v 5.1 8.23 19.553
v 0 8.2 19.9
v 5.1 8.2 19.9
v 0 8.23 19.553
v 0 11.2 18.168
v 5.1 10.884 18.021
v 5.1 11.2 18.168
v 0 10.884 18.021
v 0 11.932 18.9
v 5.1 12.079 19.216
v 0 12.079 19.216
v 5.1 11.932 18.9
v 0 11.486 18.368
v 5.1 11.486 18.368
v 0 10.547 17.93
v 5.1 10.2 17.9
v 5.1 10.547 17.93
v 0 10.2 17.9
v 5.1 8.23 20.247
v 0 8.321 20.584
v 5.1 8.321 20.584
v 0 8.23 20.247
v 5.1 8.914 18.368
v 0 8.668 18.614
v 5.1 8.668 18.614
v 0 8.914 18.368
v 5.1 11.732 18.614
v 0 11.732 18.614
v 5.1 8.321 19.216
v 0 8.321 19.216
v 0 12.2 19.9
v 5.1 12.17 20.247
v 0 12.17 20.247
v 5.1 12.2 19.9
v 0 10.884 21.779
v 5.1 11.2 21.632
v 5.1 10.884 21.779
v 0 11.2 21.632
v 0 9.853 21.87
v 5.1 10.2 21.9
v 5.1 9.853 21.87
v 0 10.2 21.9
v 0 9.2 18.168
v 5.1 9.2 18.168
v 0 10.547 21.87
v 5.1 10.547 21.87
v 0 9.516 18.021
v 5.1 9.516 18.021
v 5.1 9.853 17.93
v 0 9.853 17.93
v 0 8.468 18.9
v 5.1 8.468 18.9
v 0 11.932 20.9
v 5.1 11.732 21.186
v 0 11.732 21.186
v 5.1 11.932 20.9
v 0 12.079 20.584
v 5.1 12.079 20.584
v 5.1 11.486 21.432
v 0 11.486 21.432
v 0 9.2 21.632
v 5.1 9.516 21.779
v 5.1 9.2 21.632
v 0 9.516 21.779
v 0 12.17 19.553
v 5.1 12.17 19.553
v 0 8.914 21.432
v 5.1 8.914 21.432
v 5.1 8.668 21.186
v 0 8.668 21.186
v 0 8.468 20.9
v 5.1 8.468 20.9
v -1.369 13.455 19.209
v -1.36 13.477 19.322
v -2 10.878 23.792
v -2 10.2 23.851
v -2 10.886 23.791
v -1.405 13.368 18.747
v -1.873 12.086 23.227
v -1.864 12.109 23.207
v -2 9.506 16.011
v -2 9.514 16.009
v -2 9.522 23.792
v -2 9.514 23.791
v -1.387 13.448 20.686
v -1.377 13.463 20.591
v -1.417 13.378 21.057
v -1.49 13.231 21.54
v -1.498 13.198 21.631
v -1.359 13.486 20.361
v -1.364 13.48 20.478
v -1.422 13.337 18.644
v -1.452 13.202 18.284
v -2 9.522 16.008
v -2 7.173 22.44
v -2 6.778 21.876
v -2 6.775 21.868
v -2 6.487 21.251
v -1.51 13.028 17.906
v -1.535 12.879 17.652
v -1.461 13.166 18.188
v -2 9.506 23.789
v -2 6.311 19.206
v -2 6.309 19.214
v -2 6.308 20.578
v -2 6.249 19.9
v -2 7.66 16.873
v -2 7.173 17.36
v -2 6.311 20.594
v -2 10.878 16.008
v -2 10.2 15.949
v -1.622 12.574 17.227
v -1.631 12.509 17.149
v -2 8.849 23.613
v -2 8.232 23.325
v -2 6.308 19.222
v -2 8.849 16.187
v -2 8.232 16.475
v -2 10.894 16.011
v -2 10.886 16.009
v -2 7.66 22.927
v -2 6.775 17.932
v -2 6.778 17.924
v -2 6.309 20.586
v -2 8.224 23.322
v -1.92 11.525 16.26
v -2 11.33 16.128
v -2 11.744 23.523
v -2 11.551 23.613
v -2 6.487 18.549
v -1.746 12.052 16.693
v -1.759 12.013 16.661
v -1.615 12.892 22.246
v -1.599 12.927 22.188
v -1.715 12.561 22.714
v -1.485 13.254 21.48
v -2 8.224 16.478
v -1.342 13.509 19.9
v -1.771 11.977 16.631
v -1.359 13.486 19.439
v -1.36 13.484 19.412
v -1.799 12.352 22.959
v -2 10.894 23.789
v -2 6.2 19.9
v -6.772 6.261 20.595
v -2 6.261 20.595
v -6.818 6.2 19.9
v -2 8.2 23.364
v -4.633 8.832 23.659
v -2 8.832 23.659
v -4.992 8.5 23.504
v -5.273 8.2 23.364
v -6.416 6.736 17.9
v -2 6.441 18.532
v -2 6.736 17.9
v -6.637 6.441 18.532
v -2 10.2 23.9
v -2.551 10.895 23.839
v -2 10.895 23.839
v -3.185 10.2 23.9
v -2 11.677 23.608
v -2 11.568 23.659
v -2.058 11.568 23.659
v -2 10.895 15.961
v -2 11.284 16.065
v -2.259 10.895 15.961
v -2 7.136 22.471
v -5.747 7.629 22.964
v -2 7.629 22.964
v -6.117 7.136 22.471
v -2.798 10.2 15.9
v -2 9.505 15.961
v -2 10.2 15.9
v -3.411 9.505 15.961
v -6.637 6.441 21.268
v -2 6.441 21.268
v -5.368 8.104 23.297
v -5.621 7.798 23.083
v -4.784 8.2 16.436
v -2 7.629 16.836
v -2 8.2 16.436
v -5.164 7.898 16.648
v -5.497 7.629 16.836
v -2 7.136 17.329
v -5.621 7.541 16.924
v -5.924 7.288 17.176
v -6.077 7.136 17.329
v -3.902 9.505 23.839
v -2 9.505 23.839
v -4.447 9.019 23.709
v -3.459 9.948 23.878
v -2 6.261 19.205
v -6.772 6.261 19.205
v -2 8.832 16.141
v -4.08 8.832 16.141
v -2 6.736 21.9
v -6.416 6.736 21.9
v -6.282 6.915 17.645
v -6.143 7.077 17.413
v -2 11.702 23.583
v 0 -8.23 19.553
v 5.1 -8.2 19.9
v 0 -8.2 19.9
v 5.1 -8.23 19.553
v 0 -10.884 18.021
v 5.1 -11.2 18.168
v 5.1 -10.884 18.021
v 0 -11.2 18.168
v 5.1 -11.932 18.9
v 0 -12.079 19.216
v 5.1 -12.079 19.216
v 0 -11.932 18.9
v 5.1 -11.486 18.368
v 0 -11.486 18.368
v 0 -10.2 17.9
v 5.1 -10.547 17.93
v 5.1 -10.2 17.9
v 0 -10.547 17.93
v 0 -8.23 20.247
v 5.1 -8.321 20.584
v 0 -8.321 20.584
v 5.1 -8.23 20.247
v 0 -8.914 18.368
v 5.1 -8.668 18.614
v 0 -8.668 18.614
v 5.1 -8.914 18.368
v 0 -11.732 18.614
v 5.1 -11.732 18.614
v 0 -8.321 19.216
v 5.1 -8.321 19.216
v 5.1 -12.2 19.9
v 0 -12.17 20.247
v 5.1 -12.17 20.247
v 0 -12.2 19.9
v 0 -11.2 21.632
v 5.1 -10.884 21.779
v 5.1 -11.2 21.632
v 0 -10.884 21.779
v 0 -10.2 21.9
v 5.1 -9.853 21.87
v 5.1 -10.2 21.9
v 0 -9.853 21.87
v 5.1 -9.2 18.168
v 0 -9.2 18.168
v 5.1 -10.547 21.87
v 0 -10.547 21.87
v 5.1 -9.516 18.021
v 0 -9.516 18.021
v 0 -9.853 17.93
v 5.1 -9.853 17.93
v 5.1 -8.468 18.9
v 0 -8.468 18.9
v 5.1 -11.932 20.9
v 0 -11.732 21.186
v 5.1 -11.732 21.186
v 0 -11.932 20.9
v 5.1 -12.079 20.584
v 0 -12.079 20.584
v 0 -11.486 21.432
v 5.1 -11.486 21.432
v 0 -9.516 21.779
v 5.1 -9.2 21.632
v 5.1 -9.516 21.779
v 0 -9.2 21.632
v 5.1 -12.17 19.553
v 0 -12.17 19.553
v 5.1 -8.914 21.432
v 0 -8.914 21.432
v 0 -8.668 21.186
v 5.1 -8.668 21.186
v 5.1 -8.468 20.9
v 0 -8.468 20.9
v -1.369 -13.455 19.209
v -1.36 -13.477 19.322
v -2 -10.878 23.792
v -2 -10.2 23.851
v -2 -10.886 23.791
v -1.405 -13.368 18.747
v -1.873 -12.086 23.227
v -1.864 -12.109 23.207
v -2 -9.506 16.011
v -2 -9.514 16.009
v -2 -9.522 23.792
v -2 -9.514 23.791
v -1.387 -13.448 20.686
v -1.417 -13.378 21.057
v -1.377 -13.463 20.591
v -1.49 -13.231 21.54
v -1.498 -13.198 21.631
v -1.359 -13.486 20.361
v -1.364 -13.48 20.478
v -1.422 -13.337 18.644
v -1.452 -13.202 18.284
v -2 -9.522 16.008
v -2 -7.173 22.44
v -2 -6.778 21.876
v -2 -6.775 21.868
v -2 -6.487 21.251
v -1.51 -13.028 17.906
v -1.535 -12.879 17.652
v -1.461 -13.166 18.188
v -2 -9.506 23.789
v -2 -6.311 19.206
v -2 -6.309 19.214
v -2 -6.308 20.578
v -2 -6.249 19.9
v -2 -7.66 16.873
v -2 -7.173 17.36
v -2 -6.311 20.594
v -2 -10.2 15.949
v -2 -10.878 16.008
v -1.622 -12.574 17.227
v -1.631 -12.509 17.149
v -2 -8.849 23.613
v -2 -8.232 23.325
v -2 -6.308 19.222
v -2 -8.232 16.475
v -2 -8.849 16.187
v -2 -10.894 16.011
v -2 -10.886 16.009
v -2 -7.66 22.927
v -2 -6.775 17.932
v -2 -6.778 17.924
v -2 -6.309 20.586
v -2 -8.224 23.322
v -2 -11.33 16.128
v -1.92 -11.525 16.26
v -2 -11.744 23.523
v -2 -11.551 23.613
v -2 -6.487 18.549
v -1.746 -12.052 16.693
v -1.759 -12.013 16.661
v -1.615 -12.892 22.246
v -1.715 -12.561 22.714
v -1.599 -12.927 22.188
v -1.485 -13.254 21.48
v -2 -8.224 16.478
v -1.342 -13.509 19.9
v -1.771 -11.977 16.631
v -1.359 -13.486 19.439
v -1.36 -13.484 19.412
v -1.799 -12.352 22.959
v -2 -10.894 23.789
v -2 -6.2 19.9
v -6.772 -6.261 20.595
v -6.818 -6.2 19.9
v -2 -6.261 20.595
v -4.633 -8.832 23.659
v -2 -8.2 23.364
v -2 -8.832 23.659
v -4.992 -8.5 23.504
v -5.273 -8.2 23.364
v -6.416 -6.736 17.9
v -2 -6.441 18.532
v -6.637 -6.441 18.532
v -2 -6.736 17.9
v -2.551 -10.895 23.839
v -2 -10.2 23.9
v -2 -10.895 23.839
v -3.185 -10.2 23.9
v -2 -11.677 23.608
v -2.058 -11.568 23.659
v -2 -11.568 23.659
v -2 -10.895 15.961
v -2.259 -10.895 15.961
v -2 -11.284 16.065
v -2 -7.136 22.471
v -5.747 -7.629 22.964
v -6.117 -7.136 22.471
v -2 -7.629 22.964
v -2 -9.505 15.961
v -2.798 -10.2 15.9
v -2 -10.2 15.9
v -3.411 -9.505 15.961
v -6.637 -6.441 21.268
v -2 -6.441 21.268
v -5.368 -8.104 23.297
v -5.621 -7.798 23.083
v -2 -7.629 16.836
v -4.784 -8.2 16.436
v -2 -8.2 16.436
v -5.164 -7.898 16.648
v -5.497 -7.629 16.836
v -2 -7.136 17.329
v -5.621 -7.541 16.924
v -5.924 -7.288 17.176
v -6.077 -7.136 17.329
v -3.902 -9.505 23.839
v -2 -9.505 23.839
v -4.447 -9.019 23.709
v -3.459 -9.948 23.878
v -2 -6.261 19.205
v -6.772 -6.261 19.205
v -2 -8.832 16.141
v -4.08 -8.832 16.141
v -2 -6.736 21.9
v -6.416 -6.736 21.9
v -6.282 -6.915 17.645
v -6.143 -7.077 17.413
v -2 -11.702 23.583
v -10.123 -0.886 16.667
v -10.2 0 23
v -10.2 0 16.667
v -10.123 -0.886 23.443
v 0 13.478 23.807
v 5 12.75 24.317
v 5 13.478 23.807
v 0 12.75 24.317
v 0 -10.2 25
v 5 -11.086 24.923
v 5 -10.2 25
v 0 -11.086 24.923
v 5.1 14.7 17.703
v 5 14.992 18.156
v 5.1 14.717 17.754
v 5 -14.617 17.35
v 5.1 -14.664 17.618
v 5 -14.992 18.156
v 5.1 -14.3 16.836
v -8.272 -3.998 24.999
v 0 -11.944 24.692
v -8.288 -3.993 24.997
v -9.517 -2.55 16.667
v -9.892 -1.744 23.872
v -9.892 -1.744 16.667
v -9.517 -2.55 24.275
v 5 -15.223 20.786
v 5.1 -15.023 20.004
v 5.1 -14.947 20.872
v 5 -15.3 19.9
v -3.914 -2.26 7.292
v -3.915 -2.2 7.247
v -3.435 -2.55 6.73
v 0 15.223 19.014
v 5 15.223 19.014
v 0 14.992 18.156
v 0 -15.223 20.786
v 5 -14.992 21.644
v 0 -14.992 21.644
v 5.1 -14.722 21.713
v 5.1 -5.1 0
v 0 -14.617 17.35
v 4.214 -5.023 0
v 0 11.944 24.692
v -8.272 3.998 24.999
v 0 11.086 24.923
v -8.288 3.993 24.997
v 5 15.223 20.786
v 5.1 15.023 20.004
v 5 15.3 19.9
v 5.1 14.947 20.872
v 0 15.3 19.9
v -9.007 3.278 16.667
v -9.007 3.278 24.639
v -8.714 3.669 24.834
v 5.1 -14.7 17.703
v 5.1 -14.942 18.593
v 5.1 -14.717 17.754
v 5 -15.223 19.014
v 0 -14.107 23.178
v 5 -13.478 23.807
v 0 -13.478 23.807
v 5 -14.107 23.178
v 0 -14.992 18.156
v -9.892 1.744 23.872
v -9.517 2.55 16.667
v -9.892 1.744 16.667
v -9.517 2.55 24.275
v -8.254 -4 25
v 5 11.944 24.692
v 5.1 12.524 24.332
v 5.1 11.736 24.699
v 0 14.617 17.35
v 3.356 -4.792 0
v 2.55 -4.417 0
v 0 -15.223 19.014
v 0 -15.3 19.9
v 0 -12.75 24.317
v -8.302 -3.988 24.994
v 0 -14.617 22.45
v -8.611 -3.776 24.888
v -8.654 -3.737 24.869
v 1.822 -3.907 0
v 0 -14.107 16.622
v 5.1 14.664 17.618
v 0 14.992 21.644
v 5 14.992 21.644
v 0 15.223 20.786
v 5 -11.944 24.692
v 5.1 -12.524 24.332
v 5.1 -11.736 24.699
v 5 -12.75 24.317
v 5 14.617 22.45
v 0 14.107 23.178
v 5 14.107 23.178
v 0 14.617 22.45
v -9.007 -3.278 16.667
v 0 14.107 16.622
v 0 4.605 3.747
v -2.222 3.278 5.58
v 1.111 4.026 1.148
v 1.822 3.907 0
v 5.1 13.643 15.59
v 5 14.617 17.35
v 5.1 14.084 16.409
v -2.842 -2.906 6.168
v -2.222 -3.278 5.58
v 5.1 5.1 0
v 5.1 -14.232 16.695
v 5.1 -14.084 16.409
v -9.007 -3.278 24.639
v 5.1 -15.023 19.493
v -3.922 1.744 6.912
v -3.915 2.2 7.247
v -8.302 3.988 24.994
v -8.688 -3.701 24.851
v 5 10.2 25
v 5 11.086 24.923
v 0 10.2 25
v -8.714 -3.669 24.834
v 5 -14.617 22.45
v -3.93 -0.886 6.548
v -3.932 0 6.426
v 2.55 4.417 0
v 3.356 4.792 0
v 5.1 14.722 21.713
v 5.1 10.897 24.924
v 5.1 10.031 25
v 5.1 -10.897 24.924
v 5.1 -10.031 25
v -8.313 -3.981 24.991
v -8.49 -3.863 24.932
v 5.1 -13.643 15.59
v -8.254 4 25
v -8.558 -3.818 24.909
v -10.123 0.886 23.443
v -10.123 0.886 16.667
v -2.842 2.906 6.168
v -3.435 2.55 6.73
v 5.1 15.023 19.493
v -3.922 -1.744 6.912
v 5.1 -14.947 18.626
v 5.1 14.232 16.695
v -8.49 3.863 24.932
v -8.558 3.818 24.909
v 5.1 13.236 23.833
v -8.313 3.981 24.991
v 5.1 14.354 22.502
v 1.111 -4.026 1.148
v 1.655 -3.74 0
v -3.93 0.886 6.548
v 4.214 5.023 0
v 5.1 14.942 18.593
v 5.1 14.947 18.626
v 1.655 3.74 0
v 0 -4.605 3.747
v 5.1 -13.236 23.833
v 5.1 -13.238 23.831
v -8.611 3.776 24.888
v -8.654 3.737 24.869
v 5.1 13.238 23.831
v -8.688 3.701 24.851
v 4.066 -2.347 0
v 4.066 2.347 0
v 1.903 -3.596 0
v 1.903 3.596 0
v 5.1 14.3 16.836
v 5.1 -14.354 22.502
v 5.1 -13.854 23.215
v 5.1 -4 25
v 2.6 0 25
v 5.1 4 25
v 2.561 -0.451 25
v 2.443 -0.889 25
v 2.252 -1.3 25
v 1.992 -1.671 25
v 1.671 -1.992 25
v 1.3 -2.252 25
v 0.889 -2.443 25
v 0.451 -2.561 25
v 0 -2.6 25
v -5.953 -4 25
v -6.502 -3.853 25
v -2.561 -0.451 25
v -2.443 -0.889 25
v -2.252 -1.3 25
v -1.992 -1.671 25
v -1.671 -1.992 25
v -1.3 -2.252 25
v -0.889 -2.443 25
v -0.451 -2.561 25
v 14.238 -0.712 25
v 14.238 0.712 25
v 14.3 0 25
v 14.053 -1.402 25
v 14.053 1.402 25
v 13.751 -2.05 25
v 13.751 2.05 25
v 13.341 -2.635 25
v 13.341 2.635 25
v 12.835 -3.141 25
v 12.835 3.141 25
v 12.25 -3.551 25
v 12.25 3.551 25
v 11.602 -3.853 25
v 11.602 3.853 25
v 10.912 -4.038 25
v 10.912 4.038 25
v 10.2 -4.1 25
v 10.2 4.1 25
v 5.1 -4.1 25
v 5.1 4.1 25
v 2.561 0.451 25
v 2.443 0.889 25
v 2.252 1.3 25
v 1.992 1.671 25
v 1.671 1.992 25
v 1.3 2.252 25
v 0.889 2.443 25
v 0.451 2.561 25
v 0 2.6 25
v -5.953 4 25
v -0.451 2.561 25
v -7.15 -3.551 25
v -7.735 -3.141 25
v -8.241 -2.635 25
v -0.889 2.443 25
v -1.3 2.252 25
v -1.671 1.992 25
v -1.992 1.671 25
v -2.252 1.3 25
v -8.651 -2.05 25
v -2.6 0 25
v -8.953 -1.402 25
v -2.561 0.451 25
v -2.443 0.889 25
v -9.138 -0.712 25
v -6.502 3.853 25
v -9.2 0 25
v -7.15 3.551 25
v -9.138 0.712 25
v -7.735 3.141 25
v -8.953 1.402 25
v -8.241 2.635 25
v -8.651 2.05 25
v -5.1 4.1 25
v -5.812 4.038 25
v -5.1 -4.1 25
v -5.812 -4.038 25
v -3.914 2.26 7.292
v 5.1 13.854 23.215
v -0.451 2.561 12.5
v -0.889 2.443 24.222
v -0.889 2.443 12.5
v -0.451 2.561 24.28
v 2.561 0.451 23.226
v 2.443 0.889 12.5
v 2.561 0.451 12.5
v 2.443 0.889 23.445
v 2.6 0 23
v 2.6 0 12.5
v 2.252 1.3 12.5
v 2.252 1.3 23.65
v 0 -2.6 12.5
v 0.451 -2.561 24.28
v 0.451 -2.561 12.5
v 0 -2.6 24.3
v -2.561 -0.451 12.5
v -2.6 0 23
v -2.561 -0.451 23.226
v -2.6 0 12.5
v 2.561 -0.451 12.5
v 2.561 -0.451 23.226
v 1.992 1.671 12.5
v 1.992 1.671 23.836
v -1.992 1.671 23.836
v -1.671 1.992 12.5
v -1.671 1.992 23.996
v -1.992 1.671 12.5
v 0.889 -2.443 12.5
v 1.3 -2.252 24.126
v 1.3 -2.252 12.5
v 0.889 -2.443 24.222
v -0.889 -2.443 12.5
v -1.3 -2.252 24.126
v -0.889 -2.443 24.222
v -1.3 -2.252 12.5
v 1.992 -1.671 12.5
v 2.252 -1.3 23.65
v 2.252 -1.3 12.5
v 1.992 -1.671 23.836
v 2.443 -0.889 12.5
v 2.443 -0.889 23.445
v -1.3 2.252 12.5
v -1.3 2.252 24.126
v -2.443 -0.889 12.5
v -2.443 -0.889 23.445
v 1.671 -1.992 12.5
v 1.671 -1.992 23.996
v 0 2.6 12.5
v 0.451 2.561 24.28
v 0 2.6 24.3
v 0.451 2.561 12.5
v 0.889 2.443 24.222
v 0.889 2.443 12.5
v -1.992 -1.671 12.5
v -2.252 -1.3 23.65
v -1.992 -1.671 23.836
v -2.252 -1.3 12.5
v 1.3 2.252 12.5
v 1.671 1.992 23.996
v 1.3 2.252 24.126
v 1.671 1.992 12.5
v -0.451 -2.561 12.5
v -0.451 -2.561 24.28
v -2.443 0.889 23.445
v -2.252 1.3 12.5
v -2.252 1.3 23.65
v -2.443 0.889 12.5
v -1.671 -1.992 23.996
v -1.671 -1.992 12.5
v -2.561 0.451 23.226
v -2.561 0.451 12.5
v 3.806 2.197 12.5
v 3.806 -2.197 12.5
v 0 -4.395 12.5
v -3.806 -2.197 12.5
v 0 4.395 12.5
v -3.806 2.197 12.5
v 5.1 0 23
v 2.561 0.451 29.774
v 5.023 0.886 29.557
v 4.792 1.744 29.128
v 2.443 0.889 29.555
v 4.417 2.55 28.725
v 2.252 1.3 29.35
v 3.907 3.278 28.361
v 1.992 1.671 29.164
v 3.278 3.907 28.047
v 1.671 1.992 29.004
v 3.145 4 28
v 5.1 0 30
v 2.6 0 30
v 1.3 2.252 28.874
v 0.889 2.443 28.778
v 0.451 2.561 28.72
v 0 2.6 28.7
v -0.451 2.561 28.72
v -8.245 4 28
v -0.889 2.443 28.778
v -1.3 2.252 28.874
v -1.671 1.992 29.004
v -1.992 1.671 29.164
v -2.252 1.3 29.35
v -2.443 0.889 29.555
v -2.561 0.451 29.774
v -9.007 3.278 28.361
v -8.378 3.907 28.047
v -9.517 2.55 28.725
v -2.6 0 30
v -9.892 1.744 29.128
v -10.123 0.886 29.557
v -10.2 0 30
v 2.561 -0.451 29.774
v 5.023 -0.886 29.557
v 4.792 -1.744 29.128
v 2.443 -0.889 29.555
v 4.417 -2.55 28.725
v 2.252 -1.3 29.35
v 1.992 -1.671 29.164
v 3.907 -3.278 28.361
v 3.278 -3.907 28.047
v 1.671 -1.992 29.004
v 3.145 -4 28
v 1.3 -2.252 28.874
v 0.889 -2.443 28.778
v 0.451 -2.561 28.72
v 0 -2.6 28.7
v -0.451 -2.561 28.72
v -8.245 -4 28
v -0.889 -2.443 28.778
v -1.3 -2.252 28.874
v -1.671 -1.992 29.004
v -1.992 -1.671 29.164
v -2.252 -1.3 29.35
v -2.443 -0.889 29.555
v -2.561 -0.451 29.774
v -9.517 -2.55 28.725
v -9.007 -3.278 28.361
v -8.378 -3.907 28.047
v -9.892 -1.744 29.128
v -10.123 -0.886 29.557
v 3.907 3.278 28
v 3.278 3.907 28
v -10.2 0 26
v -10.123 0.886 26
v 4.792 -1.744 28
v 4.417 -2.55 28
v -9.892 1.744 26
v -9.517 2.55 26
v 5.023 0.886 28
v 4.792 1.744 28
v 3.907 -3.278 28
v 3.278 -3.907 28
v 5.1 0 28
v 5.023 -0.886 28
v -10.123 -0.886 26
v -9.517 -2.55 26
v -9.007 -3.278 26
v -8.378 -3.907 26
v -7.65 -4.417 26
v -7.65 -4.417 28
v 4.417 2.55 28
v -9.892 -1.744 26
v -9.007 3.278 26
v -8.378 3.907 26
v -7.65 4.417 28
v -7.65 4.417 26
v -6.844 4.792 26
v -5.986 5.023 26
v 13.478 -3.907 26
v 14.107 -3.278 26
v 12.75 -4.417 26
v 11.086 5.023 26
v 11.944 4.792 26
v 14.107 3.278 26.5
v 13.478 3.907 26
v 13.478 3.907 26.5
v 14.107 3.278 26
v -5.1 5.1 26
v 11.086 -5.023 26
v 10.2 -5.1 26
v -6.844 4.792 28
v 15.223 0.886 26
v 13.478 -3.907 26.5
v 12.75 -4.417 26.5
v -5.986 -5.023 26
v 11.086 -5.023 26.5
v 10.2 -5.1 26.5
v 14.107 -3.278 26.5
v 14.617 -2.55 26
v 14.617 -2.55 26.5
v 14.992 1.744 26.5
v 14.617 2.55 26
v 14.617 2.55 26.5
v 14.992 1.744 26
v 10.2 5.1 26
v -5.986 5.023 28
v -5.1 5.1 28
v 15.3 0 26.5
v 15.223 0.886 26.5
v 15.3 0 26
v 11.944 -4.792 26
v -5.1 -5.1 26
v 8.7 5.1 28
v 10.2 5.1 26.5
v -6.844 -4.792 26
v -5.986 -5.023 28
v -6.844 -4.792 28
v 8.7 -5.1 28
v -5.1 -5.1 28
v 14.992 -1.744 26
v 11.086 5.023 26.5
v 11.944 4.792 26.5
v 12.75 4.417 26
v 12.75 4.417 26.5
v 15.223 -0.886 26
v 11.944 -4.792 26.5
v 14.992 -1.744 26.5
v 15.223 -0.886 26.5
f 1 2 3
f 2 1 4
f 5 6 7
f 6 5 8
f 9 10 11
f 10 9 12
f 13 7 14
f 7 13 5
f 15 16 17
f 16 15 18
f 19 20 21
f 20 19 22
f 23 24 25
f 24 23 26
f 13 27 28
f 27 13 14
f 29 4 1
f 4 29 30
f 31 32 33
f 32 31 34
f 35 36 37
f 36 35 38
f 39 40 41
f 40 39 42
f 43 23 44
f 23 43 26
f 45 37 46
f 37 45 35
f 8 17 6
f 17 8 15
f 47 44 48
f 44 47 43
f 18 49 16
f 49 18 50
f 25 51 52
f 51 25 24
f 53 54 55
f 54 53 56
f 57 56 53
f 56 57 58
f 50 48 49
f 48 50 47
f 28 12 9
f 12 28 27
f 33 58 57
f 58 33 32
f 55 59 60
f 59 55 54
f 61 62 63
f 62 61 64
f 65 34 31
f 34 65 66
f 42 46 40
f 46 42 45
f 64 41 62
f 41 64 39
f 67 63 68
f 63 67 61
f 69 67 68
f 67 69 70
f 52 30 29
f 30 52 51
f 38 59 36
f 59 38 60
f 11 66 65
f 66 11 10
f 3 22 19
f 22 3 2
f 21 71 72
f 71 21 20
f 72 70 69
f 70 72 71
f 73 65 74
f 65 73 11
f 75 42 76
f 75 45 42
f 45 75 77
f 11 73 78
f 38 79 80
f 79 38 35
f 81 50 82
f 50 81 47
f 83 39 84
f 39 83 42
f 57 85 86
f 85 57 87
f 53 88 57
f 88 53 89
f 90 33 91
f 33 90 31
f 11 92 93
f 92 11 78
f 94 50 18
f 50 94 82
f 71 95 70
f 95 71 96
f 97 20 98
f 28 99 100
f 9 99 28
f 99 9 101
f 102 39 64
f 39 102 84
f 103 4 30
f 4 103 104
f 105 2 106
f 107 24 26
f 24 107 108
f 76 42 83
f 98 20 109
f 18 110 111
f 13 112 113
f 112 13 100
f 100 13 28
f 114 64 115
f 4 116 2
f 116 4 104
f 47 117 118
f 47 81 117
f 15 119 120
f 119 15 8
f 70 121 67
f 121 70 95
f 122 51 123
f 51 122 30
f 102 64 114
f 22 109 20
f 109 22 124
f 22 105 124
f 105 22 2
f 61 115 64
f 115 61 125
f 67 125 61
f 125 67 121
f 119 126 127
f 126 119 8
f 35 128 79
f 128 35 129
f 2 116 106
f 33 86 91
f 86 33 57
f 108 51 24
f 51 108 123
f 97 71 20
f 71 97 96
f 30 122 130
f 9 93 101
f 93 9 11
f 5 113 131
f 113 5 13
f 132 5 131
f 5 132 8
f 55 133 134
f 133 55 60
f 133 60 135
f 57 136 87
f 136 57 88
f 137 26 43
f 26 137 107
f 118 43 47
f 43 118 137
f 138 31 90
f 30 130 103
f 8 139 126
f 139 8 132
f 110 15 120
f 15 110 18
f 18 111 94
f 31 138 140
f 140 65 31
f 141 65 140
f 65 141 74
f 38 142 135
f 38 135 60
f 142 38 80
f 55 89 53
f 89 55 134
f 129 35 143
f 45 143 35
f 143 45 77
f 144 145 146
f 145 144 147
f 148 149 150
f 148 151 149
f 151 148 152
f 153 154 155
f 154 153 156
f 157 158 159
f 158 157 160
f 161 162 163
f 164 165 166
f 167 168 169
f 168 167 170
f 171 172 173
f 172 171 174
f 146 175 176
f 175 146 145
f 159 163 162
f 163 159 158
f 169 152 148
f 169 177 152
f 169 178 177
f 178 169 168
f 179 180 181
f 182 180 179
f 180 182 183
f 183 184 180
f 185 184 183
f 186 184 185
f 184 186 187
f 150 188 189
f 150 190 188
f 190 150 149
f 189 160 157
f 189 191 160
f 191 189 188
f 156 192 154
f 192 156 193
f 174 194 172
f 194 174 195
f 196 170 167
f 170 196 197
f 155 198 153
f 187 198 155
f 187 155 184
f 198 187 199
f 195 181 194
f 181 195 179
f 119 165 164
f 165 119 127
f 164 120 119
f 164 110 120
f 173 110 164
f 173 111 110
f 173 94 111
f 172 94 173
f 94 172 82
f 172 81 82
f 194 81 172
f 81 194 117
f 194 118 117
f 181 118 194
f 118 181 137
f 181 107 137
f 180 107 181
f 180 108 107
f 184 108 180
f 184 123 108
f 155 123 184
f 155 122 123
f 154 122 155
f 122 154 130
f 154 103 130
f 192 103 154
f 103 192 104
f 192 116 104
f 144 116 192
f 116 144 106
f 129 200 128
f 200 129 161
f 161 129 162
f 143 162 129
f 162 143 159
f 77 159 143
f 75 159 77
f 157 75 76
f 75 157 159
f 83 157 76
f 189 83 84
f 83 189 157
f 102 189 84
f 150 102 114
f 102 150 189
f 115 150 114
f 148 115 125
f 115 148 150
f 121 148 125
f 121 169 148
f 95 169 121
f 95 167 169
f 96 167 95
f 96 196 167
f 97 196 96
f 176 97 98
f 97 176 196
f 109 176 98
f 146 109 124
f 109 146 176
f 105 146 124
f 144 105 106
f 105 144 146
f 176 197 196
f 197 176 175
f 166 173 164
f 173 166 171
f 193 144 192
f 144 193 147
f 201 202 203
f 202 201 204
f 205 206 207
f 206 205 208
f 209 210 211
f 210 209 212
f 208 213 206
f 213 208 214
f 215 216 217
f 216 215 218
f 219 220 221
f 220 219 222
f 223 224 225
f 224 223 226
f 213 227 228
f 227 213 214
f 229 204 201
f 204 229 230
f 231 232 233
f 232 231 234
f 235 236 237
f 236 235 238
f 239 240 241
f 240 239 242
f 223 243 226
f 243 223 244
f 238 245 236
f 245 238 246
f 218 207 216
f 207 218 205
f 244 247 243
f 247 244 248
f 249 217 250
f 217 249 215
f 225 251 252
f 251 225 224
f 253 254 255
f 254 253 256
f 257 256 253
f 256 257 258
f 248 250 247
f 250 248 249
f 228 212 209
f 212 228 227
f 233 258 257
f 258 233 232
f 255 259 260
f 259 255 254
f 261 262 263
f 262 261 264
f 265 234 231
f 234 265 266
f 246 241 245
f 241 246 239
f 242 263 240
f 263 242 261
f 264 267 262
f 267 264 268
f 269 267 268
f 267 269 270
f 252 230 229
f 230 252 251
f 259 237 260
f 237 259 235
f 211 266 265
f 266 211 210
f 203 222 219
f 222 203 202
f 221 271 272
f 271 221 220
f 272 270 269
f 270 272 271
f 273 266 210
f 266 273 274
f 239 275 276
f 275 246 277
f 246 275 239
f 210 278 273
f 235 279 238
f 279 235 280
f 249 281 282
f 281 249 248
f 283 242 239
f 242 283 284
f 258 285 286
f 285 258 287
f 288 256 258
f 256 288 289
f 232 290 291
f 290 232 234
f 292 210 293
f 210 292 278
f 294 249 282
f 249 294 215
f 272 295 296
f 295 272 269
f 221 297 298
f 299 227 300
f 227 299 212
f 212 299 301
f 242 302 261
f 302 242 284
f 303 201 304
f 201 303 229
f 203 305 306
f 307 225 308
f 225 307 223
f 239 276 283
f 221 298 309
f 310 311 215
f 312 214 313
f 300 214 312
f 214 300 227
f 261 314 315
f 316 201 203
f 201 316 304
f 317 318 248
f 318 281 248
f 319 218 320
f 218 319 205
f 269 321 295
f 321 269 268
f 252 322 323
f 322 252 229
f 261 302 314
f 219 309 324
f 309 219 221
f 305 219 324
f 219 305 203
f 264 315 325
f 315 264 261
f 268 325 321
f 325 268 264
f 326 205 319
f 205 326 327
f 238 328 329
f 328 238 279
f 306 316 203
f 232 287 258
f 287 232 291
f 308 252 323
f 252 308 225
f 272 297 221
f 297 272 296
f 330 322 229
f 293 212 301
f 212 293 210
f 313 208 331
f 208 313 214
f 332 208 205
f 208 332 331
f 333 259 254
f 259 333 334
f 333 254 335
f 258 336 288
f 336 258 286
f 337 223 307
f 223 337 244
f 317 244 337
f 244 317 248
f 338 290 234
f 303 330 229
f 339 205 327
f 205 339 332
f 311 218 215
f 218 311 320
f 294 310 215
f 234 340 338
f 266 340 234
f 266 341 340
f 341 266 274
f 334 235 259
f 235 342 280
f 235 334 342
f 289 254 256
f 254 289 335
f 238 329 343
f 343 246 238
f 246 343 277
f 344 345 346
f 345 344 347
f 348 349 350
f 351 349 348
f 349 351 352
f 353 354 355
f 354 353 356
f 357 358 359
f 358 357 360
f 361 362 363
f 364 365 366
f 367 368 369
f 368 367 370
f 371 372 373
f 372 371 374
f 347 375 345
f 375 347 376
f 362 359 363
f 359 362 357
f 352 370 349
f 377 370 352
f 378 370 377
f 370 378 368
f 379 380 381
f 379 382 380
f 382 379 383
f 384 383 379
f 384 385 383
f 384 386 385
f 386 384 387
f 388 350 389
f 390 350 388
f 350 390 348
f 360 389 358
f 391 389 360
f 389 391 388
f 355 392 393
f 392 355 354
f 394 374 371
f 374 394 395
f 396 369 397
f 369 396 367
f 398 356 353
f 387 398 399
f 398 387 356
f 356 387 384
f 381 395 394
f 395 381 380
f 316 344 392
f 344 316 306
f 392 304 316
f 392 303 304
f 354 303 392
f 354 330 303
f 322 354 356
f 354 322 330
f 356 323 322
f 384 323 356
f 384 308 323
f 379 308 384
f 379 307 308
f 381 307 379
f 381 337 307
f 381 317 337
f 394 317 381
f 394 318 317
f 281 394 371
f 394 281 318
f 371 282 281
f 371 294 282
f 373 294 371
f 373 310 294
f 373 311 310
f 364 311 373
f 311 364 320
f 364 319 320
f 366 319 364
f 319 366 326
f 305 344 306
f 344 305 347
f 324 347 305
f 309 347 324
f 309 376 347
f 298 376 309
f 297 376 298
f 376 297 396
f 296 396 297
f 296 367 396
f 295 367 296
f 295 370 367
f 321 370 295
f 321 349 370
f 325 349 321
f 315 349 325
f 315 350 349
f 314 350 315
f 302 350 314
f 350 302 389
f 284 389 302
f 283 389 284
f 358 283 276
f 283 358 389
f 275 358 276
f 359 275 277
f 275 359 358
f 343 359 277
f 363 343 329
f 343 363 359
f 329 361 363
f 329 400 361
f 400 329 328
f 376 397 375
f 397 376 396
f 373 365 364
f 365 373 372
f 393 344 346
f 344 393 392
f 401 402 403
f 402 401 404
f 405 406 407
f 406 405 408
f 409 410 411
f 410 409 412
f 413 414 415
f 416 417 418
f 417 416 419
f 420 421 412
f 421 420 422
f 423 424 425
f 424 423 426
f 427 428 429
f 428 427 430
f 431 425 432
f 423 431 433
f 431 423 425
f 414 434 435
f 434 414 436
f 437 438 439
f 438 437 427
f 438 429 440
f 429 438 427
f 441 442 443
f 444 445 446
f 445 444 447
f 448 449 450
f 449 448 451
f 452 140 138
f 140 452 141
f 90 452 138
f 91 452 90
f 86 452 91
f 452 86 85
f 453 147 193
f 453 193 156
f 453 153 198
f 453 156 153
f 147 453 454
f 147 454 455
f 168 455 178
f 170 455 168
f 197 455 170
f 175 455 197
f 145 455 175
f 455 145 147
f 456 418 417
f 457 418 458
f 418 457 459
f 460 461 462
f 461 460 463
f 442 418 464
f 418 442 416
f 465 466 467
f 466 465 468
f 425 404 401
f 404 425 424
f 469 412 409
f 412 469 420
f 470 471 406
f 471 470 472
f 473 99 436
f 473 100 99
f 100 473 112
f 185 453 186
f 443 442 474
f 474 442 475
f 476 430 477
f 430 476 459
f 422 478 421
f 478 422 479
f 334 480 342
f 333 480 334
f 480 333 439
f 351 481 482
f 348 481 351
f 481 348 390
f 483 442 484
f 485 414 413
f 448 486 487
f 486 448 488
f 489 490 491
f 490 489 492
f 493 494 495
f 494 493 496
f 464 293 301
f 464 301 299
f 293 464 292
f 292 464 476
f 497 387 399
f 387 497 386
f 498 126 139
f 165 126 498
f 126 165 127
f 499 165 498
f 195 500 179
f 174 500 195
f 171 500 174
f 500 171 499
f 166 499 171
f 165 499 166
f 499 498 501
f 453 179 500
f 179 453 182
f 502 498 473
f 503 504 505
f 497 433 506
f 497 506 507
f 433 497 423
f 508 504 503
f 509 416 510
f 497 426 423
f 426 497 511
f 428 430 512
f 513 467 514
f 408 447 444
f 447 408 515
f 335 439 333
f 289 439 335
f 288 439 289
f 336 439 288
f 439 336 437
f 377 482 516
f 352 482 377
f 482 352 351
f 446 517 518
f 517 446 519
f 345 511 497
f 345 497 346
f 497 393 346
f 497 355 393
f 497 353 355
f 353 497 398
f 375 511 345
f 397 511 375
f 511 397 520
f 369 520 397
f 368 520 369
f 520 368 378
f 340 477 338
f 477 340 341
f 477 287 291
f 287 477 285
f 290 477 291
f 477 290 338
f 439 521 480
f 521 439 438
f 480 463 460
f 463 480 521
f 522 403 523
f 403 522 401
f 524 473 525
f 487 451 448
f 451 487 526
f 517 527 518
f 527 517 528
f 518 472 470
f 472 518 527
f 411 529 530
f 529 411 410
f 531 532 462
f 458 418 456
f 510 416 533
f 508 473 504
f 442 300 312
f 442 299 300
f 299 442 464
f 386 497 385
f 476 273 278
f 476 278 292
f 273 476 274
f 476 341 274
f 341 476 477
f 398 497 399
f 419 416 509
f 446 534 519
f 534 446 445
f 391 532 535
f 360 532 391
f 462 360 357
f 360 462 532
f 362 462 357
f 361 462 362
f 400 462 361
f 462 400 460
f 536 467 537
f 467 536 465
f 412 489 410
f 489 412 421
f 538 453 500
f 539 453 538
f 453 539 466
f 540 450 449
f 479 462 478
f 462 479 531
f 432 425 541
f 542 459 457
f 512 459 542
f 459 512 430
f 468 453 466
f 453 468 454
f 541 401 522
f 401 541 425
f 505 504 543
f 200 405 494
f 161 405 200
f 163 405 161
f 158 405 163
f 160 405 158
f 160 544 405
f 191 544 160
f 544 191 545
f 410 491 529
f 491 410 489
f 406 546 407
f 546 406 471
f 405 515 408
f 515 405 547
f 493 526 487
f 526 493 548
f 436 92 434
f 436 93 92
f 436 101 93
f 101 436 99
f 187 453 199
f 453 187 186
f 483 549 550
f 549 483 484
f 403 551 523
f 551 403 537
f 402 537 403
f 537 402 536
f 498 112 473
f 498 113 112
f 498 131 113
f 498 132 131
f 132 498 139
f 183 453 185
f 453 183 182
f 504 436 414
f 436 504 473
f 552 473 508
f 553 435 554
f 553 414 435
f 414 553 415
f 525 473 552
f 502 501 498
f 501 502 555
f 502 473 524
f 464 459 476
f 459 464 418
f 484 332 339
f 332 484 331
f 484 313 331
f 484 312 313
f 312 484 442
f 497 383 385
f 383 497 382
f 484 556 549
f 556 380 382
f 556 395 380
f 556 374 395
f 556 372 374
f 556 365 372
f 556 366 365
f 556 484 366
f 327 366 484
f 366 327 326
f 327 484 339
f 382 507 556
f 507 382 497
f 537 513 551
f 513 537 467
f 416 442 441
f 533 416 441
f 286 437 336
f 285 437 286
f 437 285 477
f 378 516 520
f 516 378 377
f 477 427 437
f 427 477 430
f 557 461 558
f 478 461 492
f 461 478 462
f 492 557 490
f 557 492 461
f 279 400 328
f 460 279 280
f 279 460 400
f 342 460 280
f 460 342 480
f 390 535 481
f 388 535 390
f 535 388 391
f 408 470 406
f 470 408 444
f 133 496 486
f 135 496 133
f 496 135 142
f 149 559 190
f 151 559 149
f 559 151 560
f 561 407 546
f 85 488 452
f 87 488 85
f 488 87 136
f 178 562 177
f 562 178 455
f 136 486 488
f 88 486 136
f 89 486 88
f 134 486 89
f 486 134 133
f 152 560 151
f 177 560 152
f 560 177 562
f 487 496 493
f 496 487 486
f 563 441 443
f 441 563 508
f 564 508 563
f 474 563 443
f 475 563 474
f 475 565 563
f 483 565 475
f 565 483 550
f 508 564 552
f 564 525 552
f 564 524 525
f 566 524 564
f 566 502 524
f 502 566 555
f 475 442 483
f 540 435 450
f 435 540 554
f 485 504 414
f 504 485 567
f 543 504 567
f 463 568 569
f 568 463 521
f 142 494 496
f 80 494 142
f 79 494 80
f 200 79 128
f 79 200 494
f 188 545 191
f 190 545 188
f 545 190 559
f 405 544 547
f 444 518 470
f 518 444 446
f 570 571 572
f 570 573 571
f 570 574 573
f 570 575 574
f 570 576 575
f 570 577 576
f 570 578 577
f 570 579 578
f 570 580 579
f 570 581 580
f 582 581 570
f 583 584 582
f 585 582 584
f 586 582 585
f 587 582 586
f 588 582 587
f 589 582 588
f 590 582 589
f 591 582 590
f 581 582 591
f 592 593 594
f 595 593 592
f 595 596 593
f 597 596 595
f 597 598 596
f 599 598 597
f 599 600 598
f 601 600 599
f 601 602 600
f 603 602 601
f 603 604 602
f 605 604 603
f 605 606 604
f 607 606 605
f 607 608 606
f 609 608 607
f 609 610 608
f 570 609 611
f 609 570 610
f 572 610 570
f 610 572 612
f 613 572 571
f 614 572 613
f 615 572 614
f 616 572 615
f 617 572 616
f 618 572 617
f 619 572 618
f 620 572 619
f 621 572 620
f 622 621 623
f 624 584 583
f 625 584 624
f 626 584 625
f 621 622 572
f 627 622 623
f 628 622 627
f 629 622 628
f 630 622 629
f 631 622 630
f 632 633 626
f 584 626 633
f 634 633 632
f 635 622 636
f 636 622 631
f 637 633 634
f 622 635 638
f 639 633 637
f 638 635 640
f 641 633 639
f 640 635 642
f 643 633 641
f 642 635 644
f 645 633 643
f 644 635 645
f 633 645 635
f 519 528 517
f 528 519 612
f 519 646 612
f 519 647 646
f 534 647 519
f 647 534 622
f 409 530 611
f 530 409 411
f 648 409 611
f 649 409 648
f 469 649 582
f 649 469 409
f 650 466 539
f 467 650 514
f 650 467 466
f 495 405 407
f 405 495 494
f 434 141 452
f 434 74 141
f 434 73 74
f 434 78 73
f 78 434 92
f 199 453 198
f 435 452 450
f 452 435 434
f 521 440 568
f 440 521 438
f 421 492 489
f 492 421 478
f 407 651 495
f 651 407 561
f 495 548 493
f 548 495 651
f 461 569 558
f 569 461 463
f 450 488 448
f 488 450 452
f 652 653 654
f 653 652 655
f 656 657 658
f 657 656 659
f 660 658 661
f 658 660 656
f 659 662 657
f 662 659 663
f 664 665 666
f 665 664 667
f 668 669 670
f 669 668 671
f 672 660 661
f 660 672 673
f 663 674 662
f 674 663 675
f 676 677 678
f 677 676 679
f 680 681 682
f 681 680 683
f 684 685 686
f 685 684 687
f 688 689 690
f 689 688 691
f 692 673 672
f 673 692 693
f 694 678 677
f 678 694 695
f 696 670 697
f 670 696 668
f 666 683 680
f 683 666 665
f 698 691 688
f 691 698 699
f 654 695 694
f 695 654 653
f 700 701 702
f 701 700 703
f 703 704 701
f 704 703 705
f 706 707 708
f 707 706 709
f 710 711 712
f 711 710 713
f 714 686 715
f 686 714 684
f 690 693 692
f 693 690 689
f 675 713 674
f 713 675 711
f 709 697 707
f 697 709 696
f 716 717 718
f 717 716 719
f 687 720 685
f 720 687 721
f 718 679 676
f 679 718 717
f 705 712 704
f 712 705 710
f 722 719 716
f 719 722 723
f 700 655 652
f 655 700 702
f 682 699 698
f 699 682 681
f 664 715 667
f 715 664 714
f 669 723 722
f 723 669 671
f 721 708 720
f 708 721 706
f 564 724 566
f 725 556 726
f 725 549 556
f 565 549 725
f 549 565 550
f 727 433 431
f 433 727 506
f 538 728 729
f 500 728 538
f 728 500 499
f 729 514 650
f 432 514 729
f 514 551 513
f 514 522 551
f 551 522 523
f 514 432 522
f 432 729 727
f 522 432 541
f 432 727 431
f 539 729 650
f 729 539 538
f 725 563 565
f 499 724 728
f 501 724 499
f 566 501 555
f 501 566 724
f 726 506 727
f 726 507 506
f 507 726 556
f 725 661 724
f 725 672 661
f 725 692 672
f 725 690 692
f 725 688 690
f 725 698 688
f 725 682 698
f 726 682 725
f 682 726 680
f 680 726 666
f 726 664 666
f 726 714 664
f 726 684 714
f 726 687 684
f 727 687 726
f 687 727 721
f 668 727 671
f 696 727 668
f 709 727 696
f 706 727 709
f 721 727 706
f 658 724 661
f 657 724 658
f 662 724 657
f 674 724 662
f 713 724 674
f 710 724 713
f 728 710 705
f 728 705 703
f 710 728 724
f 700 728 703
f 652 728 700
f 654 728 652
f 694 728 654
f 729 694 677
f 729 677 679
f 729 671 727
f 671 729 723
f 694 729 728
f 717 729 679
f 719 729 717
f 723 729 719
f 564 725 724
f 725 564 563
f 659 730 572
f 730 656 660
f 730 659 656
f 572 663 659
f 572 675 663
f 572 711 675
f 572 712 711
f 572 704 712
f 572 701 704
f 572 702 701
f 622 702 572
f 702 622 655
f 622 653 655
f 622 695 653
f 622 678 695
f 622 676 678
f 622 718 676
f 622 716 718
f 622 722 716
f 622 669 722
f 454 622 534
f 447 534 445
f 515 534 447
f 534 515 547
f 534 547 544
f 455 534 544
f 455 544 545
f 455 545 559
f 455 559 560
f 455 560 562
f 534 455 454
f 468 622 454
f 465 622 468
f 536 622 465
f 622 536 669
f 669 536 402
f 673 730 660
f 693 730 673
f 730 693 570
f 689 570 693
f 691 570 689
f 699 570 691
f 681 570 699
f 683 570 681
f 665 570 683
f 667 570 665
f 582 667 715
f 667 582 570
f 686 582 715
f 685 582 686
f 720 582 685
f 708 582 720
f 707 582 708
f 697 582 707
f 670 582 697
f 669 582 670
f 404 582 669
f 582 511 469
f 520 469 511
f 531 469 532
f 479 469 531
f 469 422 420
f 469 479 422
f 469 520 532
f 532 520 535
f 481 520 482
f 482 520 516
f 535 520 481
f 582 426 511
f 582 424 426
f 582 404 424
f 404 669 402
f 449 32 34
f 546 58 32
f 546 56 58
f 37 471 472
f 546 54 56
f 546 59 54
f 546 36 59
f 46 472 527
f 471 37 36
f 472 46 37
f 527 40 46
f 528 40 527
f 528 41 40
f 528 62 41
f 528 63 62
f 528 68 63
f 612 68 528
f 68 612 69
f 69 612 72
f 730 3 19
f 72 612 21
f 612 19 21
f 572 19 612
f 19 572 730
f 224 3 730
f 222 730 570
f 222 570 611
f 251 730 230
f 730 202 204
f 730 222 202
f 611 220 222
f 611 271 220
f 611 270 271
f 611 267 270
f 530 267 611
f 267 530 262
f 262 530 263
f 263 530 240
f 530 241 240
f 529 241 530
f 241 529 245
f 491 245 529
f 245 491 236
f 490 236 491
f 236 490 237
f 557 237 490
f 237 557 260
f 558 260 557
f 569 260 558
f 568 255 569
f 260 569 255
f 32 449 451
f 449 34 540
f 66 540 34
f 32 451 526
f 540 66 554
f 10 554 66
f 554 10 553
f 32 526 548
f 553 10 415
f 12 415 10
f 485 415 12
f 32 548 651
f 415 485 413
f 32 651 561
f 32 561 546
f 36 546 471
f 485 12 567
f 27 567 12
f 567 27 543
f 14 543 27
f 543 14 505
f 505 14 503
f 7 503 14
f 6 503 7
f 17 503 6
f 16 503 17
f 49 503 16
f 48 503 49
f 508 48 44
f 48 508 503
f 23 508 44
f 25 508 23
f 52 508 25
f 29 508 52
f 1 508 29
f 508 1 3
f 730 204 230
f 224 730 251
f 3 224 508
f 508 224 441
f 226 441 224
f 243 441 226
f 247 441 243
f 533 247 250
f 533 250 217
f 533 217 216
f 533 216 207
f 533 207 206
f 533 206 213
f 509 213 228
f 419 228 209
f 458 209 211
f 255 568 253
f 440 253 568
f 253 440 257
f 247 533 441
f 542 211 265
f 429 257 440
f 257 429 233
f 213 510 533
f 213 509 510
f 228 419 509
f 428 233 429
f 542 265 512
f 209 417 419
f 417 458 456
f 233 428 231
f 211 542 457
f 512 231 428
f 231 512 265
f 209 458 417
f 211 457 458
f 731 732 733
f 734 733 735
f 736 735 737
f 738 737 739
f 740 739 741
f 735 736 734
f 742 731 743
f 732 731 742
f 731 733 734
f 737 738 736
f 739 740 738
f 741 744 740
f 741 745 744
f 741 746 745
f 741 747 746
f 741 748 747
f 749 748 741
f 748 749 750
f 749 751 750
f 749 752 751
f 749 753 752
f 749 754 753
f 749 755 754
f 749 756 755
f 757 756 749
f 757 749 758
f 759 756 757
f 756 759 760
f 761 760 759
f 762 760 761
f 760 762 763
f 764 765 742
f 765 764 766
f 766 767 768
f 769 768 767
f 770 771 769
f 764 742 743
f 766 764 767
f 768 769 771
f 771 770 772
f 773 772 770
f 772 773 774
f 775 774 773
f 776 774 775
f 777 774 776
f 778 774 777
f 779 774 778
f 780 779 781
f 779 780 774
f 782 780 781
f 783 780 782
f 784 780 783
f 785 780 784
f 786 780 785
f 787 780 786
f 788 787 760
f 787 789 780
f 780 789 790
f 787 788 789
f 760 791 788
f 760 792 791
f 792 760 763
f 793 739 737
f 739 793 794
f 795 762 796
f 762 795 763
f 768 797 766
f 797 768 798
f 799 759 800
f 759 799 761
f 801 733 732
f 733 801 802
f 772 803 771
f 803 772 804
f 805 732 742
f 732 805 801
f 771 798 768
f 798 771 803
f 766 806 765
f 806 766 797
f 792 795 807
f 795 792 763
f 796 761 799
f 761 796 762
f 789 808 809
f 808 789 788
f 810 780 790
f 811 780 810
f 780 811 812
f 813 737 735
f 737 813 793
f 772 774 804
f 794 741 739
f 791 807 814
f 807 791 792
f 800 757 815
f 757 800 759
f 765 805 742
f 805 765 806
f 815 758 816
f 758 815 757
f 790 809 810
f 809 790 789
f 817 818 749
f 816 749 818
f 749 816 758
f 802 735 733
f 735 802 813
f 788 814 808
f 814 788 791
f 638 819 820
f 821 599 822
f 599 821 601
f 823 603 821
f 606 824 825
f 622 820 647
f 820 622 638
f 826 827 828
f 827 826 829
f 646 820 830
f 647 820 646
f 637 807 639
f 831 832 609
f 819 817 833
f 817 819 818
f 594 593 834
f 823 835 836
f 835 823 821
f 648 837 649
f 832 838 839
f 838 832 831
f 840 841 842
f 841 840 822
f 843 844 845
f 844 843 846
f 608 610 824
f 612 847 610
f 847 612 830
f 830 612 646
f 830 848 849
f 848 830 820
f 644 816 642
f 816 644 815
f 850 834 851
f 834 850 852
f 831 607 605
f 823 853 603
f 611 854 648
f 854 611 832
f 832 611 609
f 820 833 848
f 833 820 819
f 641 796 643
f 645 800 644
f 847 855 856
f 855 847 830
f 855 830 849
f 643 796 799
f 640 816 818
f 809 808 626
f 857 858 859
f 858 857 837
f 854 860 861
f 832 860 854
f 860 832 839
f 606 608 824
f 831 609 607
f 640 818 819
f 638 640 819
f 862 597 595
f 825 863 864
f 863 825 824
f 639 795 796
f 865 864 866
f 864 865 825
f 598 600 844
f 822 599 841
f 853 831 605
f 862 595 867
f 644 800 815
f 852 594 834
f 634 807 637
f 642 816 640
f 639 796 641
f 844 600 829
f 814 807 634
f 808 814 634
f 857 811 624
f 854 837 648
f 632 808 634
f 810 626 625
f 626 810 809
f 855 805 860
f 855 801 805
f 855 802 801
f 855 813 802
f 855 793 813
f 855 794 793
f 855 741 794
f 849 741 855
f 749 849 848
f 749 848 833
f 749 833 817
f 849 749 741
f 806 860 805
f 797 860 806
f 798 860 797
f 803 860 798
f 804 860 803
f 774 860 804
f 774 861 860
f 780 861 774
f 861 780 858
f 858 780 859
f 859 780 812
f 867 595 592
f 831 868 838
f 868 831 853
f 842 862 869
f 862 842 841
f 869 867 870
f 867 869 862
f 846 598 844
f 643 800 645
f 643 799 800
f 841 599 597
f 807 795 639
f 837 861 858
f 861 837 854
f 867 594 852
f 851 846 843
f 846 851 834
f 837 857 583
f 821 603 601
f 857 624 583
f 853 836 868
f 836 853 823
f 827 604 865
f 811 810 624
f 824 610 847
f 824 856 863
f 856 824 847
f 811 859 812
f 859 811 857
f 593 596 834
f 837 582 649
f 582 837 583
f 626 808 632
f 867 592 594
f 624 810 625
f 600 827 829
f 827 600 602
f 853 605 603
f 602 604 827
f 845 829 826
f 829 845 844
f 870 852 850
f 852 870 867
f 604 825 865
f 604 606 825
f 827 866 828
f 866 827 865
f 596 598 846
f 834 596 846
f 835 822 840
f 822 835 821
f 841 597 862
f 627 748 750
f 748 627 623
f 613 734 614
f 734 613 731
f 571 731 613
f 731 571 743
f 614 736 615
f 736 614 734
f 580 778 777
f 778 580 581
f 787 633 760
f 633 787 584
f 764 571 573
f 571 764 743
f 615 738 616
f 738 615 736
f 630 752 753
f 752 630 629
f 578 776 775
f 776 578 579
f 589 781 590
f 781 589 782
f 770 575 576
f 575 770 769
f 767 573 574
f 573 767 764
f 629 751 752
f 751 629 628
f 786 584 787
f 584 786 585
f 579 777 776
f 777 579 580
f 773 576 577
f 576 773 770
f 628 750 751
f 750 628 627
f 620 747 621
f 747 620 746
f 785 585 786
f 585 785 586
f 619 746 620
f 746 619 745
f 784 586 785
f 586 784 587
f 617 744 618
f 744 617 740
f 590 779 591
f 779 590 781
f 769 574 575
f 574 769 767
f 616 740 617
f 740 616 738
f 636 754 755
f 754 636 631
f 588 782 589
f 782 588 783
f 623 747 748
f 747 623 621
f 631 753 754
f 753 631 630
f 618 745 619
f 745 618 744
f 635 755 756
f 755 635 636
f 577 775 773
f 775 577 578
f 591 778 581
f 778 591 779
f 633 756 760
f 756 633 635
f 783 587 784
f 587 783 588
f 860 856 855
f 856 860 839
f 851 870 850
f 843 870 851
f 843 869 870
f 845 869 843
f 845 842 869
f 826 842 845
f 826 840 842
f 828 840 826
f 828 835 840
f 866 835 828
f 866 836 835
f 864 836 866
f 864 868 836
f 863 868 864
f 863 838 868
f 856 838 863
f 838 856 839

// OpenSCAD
// file: configuration.scad
in = 25.4;
beam = 20;

wall = 6;   //beefy carriages


spacer_height = 6; 

//this is for the big v-wheels
wheel_thick = 10.23;
wheel_rad = 23.9/2;
wheel_eff_rad = 19/2;   //radius sticking out of the v-slot

/*
//this is for the mini v-wheels
wheel_thick = 8.8;
wheel_rad = 15.23/2;
wheel_eff_rad = 11/2;   //radius sticking out of the v-slot
*/

main_beam_length = 500;
cross_beam_length = 500;

//height of the stack!
//the magnet is at zero, so nothing sticks up above the Z plane.
magnet_height = in/2;
magnet_rad = in/4;
carriage_clearance = wall + (wheel_thick/2+spacer_height)-beam/2;
echo(carriage_clearance);
                //magnet         this beam  X carriage             x beam
y_beam_height = -magnet_height - beam/2 -   carriage_clearance -   beam - carriage_clearance;
x_beam_height = -magnet_height - beam/2 - carriage_clearance;
magnet_carriage_height = -magnet_height-wall;
beam_carriage_height = -magnet_height-carriage_clearance-beam-wall;

//idler RANDOM NUMBERS
idler_rad = 9;
idler_flange_rad = 11;
idler_flange_thick = 1.5;
idler_height = 12;

//pulley RANDOM NUMBERS
pulley_rad = 9;
pulley_flange_rad = 11;
pulley_flange_thick = 1.5;
pulley_base_rad = 12;
pulley_base_thick = 10;
pulley_height = 18;


//screws et al
m5_rad = 5/2+.1;
m5_nut_rad = 8.79/2+.1;

belt_thick = 1.5;
belt_height = 6;




module beam(length = 20, center=true){
    beam_wall = 1.8;
    beam_center_rad = 4.2/2+.1;
    
    difference(){
        cube([beam, beam, length], center=center);
        
        //center hole
        translate([0,0,-.1]) cylinder(r=beam_center_rad, h=length+1, center=center, $fs=1);
        
        //inside
        translate([0,0,-.1]) difference(){
            cube([beam-beam_wall*2,beam-beam_wall*2,length+1], center=center);
            
            //center
            cube([7,7,length+2], center=true);
            //cross walls
            for(i=[45:90:179]) rotate([0,0,i]) {
                cube([1.5, 19.75, length+1], center=true);
            }
            
            //corners
            for(i=[0:90:359]) rotate([0,0,i]) translate([beam/2, beam/2,0]) {
                difference(){
                    cube([(1.8+1.07+1.75)*2, (1.8+1.07+1.75)*2, length+1], center=true);
                    cube([(1.8+1.75)*2, (1.8+1.75)*2, length+1], center=true);
                }
            }
        }
        
        //v slot channel
        for(i=[0:90:359]) rotate([0,0,i]) translate([beam/2, 0,0]) {
            rotate([0,0,45]) cube([6.5,6.5,length+2], center=true);
        }
        
        //chamfer the corners
        for(i=[0:90:359]) rotate([0,0,i]) translate([beam/2, beam/2,0]) {
            rotate([0,0,45]) cube([1,1,length+2], center=true);
        }
    }
}

module pulley(solid = 1){
    if(solid == 1){
        difference(){
            union(){
                cylinder(r=pulley_rad, h=pulley_height, center=true);
                translate([0,0,pulley_height/2-pulley_flange_thick/2])
                    cylinder(r=pulley_flange_rad, h=pulley_flange_thick, center=true);
            
                translate([0,0,-pulley_height/2+pulley_base_thick/2]) cylinder(r=pulley_base_rad, h=pulley_base_thick, center=true);
            }
        
            cylinder(r=m5_rad, h=pulley_height+1, center=true);
        }
    }else{
        cylinder(r=m5_rad, h=idler_height*5, center=true);
    }
}

module idler(solid = 1){
    if(solid == 1){
        difference(){
            union(){
                cylinder(r=idler_rad, h=idler_height, center=true);
                for(i=[0,1]) mirror([0,0,i]) translate([0,0,idler_height/2-idler_flange_thick/2]){
                    cylinder(r=idler_flange_rad, h=idler_flange_thick, center=true);
                }
            
                //ghost in some belts
                for(i=[0,1]) mirror([0,i,0]) translate([0,idler_rad+belt_thick/2,0]){
                    %cube([200,belt_thick,belt_height], center=true);
                }
            }
        
            cylinder(r=m5_rad, h=idler_height+1, center=true);
        }
    }else{
        cylinder(r=m5_rad, h=idler_height*5, center=true);
    }
}

module wheel(solid = 1){
    if(solid == 1){
        difference(){
            hull(){
                cylinder(r=wheel_rad, h=wheel_thick/3, center=true);
                cylinder(r=wheel_rad-wheel_thick/3, h=wheel_thick, center=true);
            }
        
            cylinder(r=m5_rad, h=idler_height+1, center=true);
        }
    }else{
        cylinder(r=m5_rad, h=idler_height*3, center=true);
    }
}
// main file
include <configuration.scad>

wall = 5;

clamp_width = m5_rad*2 + wall;
clamp_height = 25;
screw_sep = clamp_width;
clamp_screw_rad = 2;
clamp_screw_cap_rad = 4;
clamp_screw_cap_height = 2;

clamp_base();

translate([0,0,clamp_height]) clamp_lever();

$fn=36;

module clamp_base(){
    difference(){
        union(){
            //screw body
            hull(){
                translate([clamp_width/2,0,0]) cylinder(r=clamp_width/2, h=clamp_height);
                translate([-clamp_width/2,0,clamp_height*2/3]) cylinder(r=clamp_width/2, h=clamp_height*1/3);
                
                for(i=[0,1]) mirror([0,i,0]) translate([0,screw_sep,clamp_height-clamp_width/2])
                    rotate([0,90,0]) cylinder(r=clamp_width/2, h=wall);
            }
        }
        
        //hole for the clamp screw
        cylinder(r=m5_rad, h=clamp_height*3, center=true);
        rotate([0,0,30]) cylinder(r1=m5_nut_rad+.5, r2=m5_nut_rad-.1, h=clamp_height, center=true, $fn=6);
        
        //mount holes to the side
        for(i=[0,1]) mirror([0,i,0]) translate([0,screw_sep,clamp_height-clamp_width/2]) {
            rotate([0,90,0]) translate([0,0,-.1]) cylinder(r=clamp_screw_rad, h=50, center=true);
            rotate([0,-90,0]) cylinder(r1=clamp_screw_rad, r2=clamp_screw_cap_rad, h=clamp_screw_cap_height+.05);
            rotate([0,-90,0]) translate([0,0,clamp_screw_cap_height]) cylinder(r=clamp_screw_cap_rad, h=50);
        }
        
        //v-top for aligning
        translate([0,0,clamp_height]) scale([1,2,1]) rotate([0,90,0]) cylinder(r=clamp_screw_rad, h=50, center=true, $fn=4);
        
        //flatten
        translate([50+clamp_width/2,0,0]) cube([100,100,100], center=true);
    }
}

module clamp_lever(){
    wall = 3;
    chamfer = wall/3;
    difference(){
        union(){
            hull(){
                translate([clamp_width,0,0]) cylinder(r1=clamp_width/2-chamfer, r2=clamp_width/2, h=chamfer+.01);
                translate([-clamp_width/2,0,0]) cylinder(r1=clamp_width/2-chamfer, r2=clamp_width/2, h=chamfer+.01);
                
                translate([clamp_width,0,chamfer]) cylinder(r=clamp_width/2, h=wall-chamfer);
                translate([-clamp_width/2,0,chamfer]) cylinder(r=clamp_width/2, h=wall-chamfer);
            }
            
            intersection(){
                translate([0,0,wall]) scale([1,2,1]) rotate([0,90,0]) cylinder(r=clamp_screw_rad, h=50, center=true, $fn=4);
                hull(){
                    translate([-clamp_width/2,0,0]) cylinder(r=clamp_width/2, h=wall*2);
                    translate([0,0,0]) cylinder(r=clamp_width/2, h=wall*2);
                }
            }
        }
        
        //screwhole
        cylinder(r=m5_rad, h=clamp_height*3, center=true);
        
        //glass cutout
        hull(){
            translate([25+clamp_width,0,25+wall/2]) cube([50,50,50], center=true);
            translate([25+clamp_width-wall,0,25+wall/2+wall]) cube([50,50,50], center=true);
        }
    }
}
